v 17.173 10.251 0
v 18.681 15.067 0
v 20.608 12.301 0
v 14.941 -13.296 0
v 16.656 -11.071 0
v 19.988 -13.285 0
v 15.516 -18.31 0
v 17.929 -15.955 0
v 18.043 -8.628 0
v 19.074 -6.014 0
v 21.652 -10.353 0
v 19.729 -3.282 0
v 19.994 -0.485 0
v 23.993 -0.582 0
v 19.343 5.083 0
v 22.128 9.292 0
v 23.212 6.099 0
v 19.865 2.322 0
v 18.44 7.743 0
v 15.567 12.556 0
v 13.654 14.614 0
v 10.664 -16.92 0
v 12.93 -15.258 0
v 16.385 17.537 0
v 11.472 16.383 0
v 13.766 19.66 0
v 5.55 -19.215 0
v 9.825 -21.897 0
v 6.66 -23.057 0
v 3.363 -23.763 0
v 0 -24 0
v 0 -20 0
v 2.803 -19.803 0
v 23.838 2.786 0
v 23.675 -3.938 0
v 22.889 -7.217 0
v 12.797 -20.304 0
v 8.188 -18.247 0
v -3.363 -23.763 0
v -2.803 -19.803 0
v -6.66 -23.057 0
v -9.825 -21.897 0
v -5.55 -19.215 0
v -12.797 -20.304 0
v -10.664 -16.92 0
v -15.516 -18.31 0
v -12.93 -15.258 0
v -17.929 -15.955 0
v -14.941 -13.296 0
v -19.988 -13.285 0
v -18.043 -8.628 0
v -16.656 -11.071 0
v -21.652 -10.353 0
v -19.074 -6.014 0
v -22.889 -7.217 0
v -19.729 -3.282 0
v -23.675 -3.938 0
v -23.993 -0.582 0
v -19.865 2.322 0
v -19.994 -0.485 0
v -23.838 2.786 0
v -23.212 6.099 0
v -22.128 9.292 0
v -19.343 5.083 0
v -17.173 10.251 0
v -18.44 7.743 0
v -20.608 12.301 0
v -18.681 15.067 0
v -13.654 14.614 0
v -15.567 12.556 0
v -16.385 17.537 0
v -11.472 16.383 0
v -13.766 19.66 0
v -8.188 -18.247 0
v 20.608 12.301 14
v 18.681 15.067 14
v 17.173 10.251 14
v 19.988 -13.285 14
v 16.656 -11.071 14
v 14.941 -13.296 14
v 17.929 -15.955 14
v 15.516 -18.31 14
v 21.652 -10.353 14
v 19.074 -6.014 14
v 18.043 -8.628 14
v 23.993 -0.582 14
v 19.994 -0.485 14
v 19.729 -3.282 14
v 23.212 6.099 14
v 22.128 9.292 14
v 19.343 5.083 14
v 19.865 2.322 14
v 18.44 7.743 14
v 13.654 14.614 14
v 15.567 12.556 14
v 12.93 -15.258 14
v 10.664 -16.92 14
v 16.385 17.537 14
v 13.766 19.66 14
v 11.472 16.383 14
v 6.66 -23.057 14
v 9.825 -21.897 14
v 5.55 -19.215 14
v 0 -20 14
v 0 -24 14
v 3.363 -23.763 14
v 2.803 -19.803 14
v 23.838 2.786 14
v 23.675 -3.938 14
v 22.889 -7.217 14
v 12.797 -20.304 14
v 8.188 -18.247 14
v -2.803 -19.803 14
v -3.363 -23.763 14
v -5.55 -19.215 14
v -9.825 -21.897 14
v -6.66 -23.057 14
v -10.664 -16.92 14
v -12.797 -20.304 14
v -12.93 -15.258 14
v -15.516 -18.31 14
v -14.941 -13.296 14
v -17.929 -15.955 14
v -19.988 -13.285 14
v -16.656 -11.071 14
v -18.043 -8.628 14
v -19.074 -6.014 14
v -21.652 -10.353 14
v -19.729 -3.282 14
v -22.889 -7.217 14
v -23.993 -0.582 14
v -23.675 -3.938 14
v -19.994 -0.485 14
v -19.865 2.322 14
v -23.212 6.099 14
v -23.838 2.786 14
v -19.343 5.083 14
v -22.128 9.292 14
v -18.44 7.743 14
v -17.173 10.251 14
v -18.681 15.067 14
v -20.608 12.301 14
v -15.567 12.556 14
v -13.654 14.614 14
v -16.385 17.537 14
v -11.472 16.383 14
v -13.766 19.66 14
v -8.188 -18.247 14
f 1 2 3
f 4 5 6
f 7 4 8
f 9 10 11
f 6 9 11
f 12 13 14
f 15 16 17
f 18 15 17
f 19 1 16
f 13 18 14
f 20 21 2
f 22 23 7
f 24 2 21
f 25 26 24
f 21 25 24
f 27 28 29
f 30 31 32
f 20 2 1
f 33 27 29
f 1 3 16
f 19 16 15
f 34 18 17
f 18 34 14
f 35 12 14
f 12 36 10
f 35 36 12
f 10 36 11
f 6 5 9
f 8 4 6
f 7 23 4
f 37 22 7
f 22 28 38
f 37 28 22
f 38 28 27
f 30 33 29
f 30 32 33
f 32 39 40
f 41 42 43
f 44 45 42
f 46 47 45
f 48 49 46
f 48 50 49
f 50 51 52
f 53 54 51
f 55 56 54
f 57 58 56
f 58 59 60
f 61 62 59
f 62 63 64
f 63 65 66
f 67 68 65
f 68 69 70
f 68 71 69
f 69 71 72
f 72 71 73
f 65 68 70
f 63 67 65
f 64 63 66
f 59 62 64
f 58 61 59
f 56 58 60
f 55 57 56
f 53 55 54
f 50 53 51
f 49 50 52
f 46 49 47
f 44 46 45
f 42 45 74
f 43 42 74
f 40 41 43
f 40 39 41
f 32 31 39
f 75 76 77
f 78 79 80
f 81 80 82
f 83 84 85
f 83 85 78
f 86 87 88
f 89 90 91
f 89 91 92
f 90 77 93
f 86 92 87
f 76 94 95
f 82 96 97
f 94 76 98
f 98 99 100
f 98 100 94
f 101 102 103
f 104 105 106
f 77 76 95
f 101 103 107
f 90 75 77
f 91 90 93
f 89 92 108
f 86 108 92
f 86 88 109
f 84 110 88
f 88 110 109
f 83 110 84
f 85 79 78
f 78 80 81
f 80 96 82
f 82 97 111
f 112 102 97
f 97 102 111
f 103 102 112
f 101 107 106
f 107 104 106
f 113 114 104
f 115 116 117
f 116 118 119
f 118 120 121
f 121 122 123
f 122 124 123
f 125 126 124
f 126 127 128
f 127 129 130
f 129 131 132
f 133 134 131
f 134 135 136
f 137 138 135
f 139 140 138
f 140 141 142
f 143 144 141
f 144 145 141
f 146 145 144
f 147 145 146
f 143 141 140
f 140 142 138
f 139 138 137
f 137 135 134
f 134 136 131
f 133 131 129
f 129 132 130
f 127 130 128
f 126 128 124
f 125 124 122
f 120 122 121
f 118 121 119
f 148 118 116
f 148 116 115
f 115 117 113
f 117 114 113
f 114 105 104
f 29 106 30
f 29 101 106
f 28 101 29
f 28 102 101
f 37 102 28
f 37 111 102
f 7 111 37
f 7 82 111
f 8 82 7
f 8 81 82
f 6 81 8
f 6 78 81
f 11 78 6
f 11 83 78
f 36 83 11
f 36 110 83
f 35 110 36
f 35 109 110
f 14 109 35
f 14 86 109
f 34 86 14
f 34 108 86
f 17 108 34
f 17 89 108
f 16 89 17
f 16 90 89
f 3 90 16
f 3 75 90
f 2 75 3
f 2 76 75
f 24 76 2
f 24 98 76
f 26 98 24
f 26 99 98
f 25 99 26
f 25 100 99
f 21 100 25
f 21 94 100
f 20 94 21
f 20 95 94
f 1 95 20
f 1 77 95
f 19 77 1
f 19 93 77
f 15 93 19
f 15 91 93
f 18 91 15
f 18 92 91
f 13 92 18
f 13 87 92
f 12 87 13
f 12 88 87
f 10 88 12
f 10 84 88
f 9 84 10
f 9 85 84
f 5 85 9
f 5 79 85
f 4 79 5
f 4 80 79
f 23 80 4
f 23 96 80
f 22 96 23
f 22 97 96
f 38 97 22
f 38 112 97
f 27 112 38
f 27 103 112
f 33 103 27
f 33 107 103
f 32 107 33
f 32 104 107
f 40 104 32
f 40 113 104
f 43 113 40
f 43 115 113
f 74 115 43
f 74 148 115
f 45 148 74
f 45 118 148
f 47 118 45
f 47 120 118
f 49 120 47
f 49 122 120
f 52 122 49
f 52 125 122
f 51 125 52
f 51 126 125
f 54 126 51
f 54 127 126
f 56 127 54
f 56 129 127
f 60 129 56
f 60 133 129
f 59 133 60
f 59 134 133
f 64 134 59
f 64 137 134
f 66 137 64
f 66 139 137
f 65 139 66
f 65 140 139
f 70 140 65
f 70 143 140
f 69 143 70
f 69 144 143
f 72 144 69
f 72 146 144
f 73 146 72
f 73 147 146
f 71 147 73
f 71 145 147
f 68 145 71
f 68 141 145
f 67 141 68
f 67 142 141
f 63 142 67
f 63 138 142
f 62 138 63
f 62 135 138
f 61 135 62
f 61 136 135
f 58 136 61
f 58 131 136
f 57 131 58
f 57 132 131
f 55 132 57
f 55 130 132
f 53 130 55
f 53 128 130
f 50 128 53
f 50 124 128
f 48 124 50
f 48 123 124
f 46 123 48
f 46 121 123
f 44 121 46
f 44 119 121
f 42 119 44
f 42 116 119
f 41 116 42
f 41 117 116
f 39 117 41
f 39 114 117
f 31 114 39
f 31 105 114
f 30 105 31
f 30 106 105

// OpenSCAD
$fn = 32;

// ----------------------------------------------------------------------
// Spring clip: 48 mm outside, 4 mm band, 70 degree opening
// ----------------------------------------------------------------------

// --- parameters (mm) ---
outer_r = 24;             // clip outside radius
inner_r = 20;             // clip bore radius
band = 4;                 // band thickness
clip_w = 14;              // clip width
opening = 70;             // opening angle

clip_profile = [[-13.766, 19.66], [-16.385, 17.537], [-18.681, 15.067], [-20.608, 12.301], [-22.128, 9.292], [-23.212, 6.099], [-23.838, 2.786], [-23.993, -0.582], [-23.675, -3.938], [-22.889, -7.217], [-21.652, -10.353], [-19.988, -13.285], [-17.929, -15.955], [-15.516, -18.31], [-12.797, -20.304], [-9.825, -21.897], [-6.66, -23.057], [-3.363, -23.763], [0, -24], [3.363, -23.763], [6.66, -23.057], [9.825, -21.897], [12.797, -20.304], [15.516, -18.31], [17.929, -15.955], [19.988, -13.285], [21.652, -10.353], [22.889, -7.217], [23.675, -3.938], [23.993, -0.582], [23.838, 2.786], [23.212, 6.099], [22.128, 9.292], [20.608, 12.301], [18.681, 15.067], [16.385, 17.537], [13.766, 19.66], [11.472, 16.383], [13.654, 14.614], [15.567, 12.556], [17.173, 10.251], [18.44, 7.743], [19.343, 5.083], [19.865, 2.322], [19.994, -0.485], [19.729, -3.282], [19.074, -6.014], [18.043, -8.628], [16.656, -11.071], [14.941, -13.296], [12.93, -15.258], [10.664, -16.92], [8.188, -18.247], [5.55, -19.215], [2.803, -19.803], [0, -20], [-2.803, -19.803], [-5.55, -19.215], [-8.188, -18.247], [-10.664, -16.92], [-12.93, -15.258], [-14.941, -13.296], [-16.656, -11.071], [-18.043, -8.628], [-19.074, -6.014], [-19.729, -3.282], [-19.994, -0.485], [-19.865, 2.322], [-19.343, 5.083], [-18.44, 7.743], [-17.173, 10.251], [-15.567, 12.556], [-13.654, 14.614], [-11.472, 16.383]];

difference() {
  union() {
    linear_extrude(height = clip_w) polygon(clip_profile);
  }
}
